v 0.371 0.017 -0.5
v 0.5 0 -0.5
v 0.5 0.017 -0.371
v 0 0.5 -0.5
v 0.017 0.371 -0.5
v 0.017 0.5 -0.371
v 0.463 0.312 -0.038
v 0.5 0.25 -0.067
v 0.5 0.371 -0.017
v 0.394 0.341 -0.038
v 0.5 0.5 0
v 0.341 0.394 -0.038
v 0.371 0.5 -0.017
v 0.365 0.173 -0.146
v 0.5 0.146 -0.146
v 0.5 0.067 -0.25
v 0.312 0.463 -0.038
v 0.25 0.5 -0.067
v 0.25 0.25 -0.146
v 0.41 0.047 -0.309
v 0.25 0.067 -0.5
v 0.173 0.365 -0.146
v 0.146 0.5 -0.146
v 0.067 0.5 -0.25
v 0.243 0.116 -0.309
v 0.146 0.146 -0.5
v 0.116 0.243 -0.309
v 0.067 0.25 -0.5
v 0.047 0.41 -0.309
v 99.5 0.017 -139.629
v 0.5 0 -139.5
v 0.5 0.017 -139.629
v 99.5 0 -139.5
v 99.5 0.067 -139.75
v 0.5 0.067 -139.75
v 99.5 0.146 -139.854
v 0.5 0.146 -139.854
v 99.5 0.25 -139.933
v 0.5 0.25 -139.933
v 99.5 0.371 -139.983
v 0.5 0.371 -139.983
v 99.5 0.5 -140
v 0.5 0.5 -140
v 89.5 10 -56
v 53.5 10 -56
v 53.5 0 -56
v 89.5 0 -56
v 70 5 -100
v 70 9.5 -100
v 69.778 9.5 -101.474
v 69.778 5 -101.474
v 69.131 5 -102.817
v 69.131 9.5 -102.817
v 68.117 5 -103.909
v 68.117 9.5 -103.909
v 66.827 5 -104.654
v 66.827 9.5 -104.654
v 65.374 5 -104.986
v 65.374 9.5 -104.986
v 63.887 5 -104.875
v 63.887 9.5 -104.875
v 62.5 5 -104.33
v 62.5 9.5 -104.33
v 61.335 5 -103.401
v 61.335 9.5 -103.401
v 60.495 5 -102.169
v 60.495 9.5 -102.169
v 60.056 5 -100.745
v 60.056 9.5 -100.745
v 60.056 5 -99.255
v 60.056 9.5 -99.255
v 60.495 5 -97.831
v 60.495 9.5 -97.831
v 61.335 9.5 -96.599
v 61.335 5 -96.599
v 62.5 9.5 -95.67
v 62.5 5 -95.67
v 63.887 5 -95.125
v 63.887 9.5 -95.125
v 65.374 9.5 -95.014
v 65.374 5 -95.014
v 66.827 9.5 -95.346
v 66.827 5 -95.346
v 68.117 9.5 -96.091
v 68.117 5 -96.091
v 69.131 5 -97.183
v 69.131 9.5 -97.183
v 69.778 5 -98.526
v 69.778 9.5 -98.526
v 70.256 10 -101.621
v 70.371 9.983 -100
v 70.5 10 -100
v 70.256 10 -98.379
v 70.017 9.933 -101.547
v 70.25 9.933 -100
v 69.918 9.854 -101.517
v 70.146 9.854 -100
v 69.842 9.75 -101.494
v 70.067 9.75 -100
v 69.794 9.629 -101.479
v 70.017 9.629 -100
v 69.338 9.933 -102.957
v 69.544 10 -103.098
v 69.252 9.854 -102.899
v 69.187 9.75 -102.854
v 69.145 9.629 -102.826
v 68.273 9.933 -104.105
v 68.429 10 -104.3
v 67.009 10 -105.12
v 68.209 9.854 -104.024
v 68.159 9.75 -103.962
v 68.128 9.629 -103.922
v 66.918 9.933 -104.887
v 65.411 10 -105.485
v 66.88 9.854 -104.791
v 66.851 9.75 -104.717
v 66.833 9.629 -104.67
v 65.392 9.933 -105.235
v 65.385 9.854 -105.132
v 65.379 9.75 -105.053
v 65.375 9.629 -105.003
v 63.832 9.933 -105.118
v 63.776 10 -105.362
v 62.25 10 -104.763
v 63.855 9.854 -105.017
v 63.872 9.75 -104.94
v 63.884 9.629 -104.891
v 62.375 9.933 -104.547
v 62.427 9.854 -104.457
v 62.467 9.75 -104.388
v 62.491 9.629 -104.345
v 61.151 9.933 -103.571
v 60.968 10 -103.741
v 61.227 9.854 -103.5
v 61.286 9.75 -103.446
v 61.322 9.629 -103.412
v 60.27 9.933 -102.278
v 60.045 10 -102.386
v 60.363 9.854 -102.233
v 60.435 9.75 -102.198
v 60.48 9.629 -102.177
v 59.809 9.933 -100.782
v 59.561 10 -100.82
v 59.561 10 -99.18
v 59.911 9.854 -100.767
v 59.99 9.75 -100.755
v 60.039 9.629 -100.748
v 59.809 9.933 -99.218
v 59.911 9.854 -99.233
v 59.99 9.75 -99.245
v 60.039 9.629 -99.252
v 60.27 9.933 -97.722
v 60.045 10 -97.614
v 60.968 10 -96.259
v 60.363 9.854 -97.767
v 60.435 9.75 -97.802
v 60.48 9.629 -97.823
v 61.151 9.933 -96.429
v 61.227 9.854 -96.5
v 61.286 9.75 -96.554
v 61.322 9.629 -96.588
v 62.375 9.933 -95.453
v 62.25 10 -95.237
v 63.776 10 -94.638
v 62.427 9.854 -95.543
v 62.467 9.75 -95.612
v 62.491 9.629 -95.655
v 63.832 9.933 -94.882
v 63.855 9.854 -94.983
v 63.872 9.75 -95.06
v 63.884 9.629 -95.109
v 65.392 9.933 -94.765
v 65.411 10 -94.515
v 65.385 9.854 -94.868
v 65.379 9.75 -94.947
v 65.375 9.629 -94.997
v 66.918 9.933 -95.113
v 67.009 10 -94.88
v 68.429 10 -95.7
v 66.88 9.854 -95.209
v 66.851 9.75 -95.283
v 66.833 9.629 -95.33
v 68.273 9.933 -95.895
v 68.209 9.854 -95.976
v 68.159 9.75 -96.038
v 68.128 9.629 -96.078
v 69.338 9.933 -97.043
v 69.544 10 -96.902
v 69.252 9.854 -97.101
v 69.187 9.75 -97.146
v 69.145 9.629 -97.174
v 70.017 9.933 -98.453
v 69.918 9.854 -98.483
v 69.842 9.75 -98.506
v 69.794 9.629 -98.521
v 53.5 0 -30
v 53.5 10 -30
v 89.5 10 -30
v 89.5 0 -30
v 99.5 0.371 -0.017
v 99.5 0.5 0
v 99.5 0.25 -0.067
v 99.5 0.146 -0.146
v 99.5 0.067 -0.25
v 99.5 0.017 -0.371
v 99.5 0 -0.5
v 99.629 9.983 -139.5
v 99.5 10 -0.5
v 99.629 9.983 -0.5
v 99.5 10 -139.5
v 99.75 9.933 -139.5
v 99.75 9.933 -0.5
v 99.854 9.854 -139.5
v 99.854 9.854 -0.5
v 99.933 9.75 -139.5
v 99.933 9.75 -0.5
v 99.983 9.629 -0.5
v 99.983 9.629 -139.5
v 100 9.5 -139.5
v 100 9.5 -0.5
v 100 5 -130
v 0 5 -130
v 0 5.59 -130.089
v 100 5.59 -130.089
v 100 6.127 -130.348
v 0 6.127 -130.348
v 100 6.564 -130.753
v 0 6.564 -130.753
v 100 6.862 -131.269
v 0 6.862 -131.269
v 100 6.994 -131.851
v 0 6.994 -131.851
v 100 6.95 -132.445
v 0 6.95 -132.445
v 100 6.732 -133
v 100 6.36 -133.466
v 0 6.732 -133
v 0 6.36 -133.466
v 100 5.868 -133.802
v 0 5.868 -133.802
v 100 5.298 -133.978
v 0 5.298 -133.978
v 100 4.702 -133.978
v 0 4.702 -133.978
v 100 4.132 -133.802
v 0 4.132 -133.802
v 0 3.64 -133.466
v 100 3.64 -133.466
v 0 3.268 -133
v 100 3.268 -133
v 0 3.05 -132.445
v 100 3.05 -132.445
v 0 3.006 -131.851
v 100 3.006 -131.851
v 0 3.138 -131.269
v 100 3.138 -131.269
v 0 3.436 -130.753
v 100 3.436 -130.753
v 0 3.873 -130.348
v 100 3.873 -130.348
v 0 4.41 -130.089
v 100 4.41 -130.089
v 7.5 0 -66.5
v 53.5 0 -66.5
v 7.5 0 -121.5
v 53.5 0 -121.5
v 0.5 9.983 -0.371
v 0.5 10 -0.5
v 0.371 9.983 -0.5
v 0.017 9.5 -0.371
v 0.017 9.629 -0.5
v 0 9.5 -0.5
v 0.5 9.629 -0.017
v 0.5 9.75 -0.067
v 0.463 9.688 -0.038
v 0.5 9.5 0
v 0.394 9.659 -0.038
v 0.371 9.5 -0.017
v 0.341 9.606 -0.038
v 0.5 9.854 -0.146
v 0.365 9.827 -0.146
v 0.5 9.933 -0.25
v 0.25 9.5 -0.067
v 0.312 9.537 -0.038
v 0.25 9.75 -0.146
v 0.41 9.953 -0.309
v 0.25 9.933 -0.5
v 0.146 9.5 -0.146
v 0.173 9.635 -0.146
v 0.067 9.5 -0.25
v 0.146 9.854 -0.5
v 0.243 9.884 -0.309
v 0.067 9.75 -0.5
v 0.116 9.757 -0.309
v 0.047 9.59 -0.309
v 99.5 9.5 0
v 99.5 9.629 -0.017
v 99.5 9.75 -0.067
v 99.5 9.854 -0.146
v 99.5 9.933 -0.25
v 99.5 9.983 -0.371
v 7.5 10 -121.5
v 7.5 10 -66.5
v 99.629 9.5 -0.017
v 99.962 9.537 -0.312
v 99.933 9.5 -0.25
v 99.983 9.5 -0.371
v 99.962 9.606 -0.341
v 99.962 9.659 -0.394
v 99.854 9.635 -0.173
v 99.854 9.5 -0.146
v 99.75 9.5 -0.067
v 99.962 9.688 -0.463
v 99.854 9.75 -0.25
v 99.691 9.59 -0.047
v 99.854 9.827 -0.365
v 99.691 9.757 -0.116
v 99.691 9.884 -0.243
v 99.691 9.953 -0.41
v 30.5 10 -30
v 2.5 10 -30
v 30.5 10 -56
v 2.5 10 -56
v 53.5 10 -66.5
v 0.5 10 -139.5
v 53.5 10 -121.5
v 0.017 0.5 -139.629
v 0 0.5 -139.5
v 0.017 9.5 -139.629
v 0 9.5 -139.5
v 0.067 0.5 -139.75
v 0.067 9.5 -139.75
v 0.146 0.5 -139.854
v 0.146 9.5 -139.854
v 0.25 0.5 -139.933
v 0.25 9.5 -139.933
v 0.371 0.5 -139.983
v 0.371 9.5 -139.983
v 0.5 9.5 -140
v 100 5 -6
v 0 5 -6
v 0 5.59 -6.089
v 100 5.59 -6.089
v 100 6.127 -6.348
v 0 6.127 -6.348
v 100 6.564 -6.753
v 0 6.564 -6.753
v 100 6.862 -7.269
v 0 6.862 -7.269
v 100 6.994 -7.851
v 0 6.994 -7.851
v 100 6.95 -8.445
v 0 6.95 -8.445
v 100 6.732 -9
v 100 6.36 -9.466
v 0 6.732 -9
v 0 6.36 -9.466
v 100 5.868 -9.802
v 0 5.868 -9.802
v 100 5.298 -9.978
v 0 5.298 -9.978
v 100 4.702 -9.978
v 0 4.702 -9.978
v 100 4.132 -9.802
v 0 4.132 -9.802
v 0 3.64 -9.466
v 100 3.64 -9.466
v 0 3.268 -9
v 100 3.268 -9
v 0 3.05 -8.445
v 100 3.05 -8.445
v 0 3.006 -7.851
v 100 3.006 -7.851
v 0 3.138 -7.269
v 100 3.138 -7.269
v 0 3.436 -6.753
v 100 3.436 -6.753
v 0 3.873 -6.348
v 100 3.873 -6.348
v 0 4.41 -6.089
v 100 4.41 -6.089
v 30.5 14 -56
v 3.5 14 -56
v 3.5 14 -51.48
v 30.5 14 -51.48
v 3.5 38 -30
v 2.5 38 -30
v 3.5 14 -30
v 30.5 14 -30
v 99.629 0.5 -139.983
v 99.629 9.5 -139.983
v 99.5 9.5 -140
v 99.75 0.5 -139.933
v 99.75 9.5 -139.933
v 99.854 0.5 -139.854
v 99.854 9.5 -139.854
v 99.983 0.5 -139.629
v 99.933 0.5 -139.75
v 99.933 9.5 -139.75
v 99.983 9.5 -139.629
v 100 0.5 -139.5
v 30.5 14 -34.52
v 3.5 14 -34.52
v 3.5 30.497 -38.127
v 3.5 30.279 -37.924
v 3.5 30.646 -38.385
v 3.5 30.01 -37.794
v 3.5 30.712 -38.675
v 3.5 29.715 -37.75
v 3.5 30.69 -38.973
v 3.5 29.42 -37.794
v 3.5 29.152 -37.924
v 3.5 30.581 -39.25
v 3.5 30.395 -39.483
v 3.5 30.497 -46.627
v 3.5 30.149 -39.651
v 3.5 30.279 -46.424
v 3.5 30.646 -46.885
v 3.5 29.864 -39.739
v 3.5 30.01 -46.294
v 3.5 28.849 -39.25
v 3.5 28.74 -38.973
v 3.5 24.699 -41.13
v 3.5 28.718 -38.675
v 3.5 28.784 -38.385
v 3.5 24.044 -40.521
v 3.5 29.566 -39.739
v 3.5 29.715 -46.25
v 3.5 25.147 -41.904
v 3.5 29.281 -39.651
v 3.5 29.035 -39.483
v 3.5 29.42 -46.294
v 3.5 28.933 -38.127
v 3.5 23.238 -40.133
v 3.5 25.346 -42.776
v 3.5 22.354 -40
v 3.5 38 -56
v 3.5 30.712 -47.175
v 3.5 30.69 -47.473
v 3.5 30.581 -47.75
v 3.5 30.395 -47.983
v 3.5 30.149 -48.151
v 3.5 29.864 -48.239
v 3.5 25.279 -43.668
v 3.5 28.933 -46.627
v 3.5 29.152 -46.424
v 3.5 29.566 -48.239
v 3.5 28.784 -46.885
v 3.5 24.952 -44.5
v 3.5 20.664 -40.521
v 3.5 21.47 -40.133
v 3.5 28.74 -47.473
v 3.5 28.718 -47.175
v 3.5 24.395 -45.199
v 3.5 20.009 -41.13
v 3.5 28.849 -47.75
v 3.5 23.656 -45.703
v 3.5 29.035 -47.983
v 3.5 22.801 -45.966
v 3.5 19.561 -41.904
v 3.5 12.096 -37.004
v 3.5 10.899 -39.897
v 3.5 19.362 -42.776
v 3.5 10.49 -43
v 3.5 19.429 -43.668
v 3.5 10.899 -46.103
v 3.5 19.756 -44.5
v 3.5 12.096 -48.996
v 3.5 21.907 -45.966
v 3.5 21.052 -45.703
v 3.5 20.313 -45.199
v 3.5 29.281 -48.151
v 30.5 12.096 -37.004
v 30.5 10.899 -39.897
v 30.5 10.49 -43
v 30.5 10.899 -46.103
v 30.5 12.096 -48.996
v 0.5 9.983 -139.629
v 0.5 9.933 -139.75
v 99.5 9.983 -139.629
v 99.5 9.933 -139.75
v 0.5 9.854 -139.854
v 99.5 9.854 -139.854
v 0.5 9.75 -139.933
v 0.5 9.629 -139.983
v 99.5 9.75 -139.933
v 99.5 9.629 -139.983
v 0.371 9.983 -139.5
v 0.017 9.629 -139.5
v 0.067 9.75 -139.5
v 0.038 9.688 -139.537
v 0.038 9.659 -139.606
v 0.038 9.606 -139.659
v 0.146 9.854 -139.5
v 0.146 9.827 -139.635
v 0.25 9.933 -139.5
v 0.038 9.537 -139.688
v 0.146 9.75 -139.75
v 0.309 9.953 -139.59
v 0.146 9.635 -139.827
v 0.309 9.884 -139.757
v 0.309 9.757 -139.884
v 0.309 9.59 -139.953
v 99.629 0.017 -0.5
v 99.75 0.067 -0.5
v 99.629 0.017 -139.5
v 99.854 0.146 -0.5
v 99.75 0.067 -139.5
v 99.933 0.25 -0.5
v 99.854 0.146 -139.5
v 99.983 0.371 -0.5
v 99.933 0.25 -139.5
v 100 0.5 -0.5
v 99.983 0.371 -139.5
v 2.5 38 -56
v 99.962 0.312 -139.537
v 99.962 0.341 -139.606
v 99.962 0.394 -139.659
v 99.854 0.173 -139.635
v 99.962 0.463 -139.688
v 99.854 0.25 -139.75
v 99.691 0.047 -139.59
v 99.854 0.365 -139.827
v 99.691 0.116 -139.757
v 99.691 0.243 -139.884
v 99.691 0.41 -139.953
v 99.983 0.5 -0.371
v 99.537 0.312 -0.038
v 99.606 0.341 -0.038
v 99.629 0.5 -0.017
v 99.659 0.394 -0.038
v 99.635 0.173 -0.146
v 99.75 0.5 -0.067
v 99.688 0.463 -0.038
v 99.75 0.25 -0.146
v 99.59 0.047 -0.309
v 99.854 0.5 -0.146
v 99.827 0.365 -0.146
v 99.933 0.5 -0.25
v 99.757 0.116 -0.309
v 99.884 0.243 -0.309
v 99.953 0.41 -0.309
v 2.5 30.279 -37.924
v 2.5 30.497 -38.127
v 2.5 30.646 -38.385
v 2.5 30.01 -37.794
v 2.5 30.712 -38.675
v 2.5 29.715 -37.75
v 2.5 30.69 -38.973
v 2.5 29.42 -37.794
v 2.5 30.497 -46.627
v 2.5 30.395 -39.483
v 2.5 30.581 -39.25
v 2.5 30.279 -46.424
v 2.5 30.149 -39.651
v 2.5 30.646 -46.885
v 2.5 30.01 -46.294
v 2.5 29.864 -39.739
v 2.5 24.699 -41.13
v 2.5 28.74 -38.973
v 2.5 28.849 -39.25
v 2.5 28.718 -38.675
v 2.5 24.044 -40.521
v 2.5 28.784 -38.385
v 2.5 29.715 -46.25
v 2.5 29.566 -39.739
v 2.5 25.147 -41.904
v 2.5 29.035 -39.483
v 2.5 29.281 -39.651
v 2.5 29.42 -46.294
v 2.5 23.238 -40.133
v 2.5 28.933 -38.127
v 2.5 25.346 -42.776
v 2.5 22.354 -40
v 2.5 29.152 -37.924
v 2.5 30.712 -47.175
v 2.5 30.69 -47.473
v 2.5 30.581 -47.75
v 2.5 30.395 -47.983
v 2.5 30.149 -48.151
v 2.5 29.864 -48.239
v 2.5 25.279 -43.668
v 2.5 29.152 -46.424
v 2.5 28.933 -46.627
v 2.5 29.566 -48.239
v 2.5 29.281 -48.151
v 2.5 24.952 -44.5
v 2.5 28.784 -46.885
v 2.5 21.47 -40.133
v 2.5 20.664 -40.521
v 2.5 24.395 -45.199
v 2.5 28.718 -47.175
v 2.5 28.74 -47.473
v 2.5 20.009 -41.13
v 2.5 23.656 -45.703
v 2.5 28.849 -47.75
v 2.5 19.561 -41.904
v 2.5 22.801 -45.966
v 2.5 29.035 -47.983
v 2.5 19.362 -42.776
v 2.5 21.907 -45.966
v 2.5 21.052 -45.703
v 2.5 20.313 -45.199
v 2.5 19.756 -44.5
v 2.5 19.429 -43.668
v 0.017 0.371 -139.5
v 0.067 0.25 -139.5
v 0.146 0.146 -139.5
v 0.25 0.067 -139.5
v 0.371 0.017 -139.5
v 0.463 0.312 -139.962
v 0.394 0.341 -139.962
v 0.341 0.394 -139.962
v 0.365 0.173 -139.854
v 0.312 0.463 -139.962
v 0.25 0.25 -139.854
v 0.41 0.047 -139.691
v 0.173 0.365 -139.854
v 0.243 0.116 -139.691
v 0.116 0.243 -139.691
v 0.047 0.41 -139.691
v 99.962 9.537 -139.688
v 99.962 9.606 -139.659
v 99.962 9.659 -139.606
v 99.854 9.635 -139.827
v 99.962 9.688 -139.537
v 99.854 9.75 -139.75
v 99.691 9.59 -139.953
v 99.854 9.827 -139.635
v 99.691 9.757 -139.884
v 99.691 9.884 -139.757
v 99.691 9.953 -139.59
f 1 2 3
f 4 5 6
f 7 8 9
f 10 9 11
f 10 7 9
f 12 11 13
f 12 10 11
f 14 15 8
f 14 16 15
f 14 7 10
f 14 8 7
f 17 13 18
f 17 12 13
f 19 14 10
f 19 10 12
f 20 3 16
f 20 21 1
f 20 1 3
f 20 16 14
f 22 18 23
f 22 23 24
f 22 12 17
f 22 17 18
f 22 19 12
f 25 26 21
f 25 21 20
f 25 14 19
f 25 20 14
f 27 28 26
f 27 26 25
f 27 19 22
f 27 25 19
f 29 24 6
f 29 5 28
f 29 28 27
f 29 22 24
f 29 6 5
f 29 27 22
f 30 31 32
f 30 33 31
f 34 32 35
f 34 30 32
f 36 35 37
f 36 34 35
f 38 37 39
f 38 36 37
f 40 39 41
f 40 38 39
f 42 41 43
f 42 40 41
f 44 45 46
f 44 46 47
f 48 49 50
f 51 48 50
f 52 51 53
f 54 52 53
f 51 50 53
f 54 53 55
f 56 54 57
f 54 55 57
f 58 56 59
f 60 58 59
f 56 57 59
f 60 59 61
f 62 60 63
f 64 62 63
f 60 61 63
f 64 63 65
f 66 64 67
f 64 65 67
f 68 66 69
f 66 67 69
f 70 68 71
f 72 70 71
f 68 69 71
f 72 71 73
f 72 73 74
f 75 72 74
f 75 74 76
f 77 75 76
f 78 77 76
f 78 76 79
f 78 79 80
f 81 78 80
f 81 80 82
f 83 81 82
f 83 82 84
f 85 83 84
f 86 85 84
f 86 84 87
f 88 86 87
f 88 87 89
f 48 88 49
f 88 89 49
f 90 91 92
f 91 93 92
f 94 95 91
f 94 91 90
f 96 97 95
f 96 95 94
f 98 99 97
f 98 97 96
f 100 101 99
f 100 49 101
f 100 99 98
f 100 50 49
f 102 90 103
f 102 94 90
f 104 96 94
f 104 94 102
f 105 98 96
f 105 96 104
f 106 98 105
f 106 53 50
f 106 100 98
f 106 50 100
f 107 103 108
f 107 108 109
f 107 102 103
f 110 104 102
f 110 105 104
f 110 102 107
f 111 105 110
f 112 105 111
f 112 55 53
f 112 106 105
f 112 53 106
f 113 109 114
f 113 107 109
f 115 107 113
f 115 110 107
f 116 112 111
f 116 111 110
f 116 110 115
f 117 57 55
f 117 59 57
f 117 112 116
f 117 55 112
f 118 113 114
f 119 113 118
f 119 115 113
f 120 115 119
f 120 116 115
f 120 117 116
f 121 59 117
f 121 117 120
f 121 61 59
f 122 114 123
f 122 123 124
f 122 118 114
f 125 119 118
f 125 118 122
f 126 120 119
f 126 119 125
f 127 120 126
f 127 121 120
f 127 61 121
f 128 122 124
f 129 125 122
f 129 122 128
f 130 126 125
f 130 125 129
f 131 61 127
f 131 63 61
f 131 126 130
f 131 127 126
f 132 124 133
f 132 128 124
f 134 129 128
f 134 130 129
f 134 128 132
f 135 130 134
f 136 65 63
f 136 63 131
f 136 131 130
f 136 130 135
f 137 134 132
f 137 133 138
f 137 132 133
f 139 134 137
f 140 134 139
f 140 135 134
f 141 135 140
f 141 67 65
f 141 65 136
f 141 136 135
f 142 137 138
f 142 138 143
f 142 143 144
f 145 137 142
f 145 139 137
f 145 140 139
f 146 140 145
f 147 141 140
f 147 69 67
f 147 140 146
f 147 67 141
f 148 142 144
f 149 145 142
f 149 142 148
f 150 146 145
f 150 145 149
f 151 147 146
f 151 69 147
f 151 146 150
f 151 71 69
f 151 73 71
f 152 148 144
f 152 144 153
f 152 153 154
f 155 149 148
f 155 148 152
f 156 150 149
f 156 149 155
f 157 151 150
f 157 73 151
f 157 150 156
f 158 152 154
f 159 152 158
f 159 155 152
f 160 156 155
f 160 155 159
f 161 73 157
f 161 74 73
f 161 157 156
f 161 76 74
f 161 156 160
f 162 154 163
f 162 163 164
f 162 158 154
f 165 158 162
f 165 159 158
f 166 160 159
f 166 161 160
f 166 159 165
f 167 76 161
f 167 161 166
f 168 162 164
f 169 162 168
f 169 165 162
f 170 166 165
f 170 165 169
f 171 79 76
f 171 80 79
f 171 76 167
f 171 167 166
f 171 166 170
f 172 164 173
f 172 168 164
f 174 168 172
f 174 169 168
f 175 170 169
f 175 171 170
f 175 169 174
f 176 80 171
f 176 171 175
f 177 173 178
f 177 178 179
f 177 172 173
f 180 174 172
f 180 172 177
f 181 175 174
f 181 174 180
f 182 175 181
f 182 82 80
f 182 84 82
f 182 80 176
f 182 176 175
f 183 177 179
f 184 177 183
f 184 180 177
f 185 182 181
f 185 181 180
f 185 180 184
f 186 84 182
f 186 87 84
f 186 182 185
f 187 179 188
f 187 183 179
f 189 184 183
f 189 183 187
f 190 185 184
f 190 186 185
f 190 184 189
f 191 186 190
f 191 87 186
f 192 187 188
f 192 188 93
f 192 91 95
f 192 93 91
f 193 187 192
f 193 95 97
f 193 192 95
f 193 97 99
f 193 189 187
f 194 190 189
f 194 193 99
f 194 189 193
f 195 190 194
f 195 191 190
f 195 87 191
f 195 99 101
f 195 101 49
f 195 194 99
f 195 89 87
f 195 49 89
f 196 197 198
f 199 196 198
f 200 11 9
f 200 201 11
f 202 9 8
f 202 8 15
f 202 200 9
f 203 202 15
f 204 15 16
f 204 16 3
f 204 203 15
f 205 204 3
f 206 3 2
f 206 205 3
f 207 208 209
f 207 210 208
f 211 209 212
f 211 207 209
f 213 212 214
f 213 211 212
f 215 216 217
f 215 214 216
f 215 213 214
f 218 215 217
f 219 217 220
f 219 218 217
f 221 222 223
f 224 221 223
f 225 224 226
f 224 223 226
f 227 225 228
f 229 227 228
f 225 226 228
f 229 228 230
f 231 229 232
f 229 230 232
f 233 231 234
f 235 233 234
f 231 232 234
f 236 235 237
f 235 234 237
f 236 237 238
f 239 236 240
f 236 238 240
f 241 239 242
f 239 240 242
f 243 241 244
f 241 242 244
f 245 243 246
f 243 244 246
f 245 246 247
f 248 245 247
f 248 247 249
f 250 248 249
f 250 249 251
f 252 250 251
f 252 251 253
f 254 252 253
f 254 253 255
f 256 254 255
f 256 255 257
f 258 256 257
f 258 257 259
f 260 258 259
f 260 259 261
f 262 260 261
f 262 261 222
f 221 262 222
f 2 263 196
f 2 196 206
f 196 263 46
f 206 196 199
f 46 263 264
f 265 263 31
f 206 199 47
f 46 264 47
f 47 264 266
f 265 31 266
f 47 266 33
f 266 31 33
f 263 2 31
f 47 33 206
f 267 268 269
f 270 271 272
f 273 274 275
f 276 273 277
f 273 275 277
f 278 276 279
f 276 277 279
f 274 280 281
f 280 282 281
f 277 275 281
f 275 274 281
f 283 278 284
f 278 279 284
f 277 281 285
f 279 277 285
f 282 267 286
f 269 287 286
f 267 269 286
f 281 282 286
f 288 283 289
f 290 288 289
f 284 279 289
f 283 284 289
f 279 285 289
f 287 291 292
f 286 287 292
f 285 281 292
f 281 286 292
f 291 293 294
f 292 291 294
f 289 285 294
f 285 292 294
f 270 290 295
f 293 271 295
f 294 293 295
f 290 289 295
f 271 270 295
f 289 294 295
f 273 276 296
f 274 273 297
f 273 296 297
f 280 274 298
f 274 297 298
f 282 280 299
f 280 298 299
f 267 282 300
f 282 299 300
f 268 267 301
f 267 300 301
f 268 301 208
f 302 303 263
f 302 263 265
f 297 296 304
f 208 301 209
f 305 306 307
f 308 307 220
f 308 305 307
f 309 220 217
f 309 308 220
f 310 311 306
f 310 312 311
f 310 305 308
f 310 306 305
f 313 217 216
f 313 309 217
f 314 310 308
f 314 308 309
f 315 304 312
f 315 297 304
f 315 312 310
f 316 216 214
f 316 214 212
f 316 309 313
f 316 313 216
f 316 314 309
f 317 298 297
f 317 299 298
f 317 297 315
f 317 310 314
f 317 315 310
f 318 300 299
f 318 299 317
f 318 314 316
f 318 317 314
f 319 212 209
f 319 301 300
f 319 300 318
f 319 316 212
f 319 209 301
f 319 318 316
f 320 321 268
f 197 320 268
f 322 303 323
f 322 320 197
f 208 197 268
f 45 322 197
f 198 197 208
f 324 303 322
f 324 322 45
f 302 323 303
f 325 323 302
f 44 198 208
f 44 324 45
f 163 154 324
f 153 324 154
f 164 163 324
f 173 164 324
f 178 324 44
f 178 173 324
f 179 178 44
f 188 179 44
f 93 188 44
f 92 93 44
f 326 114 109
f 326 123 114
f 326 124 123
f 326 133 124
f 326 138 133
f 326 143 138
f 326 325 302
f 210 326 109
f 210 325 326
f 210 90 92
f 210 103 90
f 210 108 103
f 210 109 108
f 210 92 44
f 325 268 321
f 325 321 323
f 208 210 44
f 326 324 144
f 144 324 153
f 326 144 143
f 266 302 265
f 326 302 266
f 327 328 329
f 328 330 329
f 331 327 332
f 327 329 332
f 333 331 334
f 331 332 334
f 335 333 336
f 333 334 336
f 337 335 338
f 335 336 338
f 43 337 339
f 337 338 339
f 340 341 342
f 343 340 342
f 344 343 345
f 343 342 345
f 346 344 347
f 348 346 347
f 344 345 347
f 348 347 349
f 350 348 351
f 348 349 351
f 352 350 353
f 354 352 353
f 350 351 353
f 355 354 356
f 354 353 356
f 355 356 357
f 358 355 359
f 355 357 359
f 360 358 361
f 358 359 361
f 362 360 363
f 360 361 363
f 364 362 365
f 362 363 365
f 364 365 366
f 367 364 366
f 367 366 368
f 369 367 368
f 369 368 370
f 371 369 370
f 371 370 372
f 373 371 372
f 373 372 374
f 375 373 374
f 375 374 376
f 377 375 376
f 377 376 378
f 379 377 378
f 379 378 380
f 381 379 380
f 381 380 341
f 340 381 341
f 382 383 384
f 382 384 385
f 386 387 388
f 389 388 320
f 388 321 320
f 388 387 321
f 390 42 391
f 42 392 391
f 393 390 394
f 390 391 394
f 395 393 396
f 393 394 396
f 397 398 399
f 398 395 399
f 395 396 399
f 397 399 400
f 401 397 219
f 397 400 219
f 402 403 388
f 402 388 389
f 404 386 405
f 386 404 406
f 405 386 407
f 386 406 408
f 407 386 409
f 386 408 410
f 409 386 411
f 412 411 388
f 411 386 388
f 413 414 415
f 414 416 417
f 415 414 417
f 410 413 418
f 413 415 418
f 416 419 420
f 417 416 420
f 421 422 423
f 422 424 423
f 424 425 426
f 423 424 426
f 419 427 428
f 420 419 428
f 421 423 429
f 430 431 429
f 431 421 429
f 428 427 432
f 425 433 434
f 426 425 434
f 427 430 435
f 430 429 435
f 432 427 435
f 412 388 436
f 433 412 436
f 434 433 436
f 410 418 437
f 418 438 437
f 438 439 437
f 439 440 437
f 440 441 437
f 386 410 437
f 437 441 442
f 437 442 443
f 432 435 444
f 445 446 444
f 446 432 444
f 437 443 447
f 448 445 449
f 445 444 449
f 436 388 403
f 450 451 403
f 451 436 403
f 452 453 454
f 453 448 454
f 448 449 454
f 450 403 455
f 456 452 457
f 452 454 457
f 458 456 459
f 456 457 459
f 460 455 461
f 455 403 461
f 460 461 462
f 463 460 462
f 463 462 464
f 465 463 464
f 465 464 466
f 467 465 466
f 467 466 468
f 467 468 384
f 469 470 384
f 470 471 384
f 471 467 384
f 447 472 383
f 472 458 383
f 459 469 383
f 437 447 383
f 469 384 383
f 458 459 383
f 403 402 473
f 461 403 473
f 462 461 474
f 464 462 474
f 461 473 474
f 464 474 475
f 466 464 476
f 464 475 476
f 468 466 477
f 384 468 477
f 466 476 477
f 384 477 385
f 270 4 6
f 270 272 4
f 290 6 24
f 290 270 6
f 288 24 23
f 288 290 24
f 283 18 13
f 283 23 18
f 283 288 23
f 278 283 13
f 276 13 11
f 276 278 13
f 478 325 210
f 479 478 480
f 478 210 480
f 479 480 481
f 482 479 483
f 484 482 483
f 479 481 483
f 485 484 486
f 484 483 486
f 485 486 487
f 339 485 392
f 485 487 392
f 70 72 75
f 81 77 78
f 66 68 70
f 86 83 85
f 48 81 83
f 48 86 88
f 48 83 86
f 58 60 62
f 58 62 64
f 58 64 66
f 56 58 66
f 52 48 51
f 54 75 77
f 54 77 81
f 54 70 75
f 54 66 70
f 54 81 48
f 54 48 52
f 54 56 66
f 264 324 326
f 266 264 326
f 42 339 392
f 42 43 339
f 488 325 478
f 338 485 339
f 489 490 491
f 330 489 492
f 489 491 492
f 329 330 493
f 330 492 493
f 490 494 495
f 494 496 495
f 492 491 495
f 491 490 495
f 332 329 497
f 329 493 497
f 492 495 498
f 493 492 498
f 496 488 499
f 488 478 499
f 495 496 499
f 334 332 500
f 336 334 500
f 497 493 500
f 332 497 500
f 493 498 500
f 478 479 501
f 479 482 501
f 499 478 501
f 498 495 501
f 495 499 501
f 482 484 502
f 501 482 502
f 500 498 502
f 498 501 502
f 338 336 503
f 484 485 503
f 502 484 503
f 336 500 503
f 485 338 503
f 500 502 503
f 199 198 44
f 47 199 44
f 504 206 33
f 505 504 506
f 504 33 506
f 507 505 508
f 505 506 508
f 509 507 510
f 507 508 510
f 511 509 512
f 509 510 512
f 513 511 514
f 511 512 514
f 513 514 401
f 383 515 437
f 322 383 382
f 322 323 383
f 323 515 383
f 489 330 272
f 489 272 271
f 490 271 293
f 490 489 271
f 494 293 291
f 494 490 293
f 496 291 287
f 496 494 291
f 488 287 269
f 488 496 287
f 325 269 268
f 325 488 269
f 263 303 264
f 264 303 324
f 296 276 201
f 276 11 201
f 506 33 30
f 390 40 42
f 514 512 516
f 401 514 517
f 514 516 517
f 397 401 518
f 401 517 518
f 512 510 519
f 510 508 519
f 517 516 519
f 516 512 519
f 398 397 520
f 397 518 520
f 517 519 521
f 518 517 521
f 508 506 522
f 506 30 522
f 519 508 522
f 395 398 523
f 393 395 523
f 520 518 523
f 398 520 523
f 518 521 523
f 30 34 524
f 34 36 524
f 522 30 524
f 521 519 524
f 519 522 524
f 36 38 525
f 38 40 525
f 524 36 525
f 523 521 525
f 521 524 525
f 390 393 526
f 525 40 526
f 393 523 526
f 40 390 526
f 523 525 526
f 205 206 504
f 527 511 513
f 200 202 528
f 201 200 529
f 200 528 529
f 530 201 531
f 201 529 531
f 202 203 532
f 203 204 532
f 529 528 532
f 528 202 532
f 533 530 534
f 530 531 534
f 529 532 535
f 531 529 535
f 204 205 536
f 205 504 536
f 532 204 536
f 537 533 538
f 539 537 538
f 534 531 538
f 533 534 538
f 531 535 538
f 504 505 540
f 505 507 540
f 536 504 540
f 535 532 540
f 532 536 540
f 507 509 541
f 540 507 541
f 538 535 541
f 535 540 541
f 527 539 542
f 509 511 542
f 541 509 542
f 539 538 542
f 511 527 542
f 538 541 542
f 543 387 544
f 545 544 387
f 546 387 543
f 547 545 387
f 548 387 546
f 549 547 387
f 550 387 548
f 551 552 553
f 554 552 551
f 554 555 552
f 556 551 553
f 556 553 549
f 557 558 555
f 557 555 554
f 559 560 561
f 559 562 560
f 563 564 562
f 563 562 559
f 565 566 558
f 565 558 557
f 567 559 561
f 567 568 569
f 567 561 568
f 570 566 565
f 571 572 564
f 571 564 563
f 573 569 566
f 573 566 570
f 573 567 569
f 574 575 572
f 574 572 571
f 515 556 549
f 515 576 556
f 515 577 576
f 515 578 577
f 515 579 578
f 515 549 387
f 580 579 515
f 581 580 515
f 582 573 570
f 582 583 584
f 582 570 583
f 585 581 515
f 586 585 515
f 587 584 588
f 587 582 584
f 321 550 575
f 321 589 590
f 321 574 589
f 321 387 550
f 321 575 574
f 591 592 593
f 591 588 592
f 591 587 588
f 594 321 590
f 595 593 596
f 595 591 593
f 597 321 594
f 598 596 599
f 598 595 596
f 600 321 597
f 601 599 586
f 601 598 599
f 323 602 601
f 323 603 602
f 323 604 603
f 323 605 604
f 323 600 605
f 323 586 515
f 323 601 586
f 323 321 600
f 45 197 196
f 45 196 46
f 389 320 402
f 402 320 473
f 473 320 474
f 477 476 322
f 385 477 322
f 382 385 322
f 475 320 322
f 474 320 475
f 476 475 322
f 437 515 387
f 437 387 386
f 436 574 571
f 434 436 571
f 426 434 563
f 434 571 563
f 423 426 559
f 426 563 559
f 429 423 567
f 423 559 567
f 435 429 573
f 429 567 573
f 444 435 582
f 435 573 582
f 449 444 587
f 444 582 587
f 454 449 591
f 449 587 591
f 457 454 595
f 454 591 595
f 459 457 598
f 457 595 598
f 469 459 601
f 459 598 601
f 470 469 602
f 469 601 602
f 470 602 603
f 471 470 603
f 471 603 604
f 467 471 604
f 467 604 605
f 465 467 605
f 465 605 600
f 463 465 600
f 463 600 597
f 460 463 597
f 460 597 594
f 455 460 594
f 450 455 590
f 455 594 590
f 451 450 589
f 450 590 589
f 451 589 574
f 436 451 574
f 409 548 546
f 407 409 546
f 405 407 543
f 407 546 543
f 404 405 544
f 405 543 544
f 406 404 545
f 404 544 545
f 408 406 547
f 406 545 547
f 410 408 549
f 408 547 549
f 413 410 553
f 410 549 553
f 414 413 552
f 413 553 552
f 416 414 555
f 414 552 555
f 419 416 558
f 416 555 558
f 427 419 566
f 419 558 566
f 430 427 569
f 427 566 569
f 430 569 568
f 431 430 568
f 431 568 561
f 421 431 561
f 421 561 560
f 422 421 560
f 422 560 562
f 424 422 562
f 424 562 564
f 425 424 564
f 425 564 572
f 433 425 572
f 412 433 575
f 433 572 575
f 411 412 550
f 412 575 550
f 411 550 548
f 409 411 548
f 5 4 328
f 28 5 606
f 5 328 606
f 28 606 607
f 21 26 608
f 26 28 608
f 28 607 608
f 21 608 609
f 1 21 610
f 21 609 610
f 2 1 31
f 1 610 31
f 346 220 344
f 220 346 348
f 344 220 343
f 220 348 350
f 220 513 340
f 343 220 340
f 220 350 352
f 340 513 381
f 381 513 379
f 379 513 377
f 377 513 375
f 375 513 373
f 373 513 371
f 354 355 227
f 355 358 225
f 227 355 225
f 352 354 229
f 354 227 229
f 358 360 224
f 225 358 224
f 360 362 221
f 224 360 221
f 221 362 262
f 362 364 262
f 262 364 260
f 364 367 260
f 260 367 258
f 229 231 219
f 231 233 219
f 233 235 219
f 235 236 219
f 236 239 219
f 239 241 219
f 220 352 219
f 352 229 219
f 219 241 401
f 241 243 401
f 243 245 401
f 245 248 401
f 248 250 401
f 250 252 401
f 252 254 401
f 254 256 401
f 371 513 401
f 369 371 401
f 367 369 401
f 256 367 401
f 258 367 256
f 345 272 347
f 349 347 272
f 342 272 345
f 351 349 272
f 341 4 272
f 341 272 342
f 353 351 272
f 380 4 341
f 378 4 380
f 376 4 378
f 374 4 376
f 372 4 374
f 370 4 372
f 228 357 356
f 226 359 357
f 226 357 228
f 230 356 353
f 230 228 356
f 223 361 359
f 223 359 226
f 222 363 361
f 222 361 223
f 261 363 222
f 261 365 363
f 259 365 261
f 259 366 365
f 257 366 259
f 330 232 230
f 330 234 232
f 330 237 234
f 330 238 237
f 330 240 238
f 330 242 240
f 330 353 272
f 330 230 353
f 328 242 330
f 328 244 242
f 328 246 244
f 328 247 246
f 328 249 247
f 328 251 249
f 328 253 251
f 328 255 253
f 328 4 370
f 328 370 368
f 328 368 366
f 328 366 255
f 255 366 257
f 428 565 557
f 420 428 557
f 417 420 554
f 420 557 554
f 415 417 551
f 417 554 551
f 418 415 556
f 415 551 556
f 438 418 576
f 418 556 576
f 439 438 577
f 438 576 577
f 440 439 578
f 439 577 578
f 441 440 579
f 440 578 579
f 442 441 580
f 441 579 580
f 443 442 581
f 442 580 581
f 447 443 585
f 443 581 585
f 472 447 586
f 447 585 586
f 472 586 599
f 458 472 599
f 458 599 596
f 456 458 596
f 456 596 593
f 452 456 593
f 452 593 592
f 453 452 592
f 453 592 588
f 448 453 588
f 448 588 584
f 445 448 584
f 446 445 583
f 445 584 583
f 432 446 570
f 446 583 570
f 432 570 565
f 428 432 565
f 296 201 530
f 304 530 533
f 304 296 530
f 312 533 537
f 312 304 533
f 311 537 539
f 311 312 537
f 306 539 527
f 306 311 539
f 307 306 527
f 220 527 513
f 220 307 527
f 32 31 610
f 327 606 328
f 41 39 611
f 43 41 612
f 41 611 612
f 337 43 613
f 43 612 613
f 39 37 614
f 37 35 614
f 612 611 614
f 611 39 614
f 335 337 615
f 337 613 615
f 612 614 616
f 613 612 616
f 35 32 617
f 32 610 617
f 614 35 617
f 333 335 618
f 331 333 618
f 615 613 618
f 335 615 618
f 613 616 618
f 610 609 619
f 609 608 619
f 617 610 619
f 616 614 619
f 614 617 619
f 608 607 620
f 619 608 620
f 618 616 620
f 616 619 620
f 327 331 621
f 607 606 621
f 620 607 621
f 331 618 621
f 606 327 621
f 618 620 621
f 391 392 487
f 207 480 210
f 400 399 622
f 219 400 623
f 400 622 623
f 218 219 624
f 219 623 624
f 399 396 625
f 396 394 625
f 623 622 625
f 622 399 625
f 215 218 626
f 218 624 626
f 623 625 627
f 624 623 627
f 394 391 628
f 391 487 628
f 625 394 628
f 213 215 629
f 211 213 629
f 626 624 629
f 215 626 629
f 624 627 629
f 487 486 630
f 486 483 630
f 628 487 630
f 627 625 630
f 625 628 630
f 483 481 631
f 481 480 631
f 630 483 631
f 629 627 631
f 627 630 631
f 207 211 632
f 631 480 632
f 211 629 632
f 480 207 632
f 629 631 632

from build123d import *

# Parameters (mm, degrees)
SKETCH2_W               = 100
SKETCH2_H               = 140
BOSS_EXTRUDE1_DEPTH     = 10
SKETCH3_R               = 5
MOUNTHOLE_DEPTH         = 5
SKETCH4_R               = 2
CUT_EXTRUDE2_DEPTH      = 101
SKETCH5_R               = 2
CUT_EXTRUDE3_DEPTH      = 101
FILLET4_R               = 0.5
FILLET6_R               = 0.5
SKETCH7_W               = 28
SKETCH7_H               = 26
BOSS_EXTRUDE2_DEPTH     = 4
SKETCH21_W              = 46
SKETCH21_H              = 55
SKETCH21_W_2            = 36
SKETCH21_H_2            = 26
CUT_EXTRUDE10_DEPTH     = 11
SKETCH10_W              = 1
SKETCH10_H              = 26
BOSS_EXTRUDE3_DEPTH     = 24
SKETCH13_R              = 3
SKETCH13_R_2            = 1
CUT_EXTRUDE6_DEPTH      = 1
CUT_EXTRUDE9_DEPTH      = 70.5
CUT_EXTRUDE9_DEPTH_BACK = 27


with BuildPart() as part:
    # Sketch2 → Boss-Extrude1 (new body)
    with BuildSketch(Plane(origin=(0, 0, 0), x_dir=(1, 0, 0), z_dir=(0, 1, 0))):
        with Locations((50, 70)):
            Rectangle(SKETCH2_W, SKETCH2_H)
    extrude(amount=BOSS_EXTRUDE1_DEPTH)

    # Sketch3 → MountHole (cut)
    with BuildSketch(Plane(origin=(0, 10, 0), x_dir=(1, 0, 0), z_dir=(0, 1, 0))):
        with Locations((65, 100)):
            Circle(SKETCH3_R)
    extrude(amount=-MOUNTHOLE_DEPTH, mode=Mode.SUBTRACT)

    # Sketch4 → Cut-Extrude2 (cut, through all)
    with BuildSketch(Plane.ZY):
        with Locations((-8, 5)):
            Circle(SKETCH4_R)
    extrude(amount=-CUT_EXTRUDE2_DEPTH, mode=Mode.SUBTRACT)

    # Sketch5 → Cut-Extrude3 (cut, through all)
    with BuildSketch(Plane.ZY):
        with Locations((-132, 5)):
            Circle(SKETCH5_R)
    extrude(amount=-CUT_EXTRUDE3_DEPTH, mode=Mode.SUBTRACT)

    # Fillet4
    fillet4_edges = [part.edges().sort_by_distance(p)[0] for p in [
        (50, 10, -140),
        (0, 10, -70),
        (50, 10, 0),
        (0, 0, -70),
        (50, 0, -140),
        (100, 0, -70),
        (50, 0, 0),
        (0, 5, 0),
        (0, 5, -140),
        (100, 5, -140),
        (100, 5, 0),
        (100, 10, -70),
    ]]
    fillet(fillet4_edges, radius=FILLET4_R)

    # Fillet6
    fillet6_edges = [part.edges().sort_by_distance(p)[0] for p in [
        (60, 10, -100),
    ]]
    fillet(fillet6_edges, radius=FILLET6_R)

    # Sketch7 → Boss-Extrude2 (add)
    with BuildSketch(Plane(origin=(0, 10, 0), x_dir=(1, 0, 0), z_dir=(0, 1, 0))):
        with Locations((16.5, 43)):
            Rectangle(SKETCH7_W, SKETCH7_H)
    extrude(amount=BOSS_EXTRUDE2_DEPTH)

    # Sketch21 → Cut-Extrude10 (cut, through all)
    with BuildSketch(Plane(origin=(0, 10, 0), x_dir=(1, 0, 0), z_dir=(0, 1, 0))):
        with Locations((30.5, 94)):
            Rectangle(SKETCH21_W, SKETCH21_H)
        with Locations((71.5, 43)):
            Rectangle(SKETCH21_W_2, SKETCH21_H_2)
    extrude(amount=-CUT_EXTRUDE10_DEPTH, mode=Mode.SUBTRACT)

    # Sketch10 → Boss-Extrude3 (add)
    with BuildSketch(Plane(origin=(0, 14, 0), x_dir=(1, 0, 0), z_dir=(0, 1, 0))):
        with Locations((3, 43)):
            Rectangle(SKETCH10_W, SKETCH10_H)
    extrude(amount=BOSS_EXTRUDE3_DEPTH)

    # Sketch13 → Cut-Extrude6 (cut)
    with BuildSketch(Plane.ZY.offset(-2.5)):
        with Locations((-43, 22.354)):
            Circle(SKETCH13_R)
        with Locations((-38.75, 29.715215932)):
            Circle(SKETCH13_R_2)
        with Locations((-47.25, 29.715215932)):
            Circle(SKETCH13_R_2)
    extrude(amount=-CUT_EXTRUDE6_DEPTH, mode=Mode.SUBTRACT)

    # Sketch20 → Cut-Extrude9 (cut, two sides)
    with BuildSketch(Plane(origin=(30.5, 0, 0), x_dir=(0, 0, -1), z_dir=(1, 0, 0))) as cut_extrude9_sk:
        with BuildLine():
            Line((-205.175487121, 14), (30, 14))
            Line((30, 14), (34.519834012, 14))
            ThreePointArc((34.519834012, 14), (43, 10.490393679), (51.480165988, 14))
            Line((51.480165988, 14), (56, 14))
            Line((56, 14), (291.175487121, 14))
            Line((291.175487121, 14), (291.175487121, 484.350974241))
            Line((291.175487121, 484.350974241), (-205.175487121, 484.350974241))
            Line((-205.175487121, 484.350974241), (-205.175487121, 14))
        make_face()
    extrude(amount=CUT_EXTRUDE9_DEPTH, mode=Mode.SUBTRACT)
    extrude(cut_extrude9_sk.sketch, amount=-CUT_EXTRUDE9_DEPTH_BACK, mode=Mode.SUBTRACT)


solid = part.part
